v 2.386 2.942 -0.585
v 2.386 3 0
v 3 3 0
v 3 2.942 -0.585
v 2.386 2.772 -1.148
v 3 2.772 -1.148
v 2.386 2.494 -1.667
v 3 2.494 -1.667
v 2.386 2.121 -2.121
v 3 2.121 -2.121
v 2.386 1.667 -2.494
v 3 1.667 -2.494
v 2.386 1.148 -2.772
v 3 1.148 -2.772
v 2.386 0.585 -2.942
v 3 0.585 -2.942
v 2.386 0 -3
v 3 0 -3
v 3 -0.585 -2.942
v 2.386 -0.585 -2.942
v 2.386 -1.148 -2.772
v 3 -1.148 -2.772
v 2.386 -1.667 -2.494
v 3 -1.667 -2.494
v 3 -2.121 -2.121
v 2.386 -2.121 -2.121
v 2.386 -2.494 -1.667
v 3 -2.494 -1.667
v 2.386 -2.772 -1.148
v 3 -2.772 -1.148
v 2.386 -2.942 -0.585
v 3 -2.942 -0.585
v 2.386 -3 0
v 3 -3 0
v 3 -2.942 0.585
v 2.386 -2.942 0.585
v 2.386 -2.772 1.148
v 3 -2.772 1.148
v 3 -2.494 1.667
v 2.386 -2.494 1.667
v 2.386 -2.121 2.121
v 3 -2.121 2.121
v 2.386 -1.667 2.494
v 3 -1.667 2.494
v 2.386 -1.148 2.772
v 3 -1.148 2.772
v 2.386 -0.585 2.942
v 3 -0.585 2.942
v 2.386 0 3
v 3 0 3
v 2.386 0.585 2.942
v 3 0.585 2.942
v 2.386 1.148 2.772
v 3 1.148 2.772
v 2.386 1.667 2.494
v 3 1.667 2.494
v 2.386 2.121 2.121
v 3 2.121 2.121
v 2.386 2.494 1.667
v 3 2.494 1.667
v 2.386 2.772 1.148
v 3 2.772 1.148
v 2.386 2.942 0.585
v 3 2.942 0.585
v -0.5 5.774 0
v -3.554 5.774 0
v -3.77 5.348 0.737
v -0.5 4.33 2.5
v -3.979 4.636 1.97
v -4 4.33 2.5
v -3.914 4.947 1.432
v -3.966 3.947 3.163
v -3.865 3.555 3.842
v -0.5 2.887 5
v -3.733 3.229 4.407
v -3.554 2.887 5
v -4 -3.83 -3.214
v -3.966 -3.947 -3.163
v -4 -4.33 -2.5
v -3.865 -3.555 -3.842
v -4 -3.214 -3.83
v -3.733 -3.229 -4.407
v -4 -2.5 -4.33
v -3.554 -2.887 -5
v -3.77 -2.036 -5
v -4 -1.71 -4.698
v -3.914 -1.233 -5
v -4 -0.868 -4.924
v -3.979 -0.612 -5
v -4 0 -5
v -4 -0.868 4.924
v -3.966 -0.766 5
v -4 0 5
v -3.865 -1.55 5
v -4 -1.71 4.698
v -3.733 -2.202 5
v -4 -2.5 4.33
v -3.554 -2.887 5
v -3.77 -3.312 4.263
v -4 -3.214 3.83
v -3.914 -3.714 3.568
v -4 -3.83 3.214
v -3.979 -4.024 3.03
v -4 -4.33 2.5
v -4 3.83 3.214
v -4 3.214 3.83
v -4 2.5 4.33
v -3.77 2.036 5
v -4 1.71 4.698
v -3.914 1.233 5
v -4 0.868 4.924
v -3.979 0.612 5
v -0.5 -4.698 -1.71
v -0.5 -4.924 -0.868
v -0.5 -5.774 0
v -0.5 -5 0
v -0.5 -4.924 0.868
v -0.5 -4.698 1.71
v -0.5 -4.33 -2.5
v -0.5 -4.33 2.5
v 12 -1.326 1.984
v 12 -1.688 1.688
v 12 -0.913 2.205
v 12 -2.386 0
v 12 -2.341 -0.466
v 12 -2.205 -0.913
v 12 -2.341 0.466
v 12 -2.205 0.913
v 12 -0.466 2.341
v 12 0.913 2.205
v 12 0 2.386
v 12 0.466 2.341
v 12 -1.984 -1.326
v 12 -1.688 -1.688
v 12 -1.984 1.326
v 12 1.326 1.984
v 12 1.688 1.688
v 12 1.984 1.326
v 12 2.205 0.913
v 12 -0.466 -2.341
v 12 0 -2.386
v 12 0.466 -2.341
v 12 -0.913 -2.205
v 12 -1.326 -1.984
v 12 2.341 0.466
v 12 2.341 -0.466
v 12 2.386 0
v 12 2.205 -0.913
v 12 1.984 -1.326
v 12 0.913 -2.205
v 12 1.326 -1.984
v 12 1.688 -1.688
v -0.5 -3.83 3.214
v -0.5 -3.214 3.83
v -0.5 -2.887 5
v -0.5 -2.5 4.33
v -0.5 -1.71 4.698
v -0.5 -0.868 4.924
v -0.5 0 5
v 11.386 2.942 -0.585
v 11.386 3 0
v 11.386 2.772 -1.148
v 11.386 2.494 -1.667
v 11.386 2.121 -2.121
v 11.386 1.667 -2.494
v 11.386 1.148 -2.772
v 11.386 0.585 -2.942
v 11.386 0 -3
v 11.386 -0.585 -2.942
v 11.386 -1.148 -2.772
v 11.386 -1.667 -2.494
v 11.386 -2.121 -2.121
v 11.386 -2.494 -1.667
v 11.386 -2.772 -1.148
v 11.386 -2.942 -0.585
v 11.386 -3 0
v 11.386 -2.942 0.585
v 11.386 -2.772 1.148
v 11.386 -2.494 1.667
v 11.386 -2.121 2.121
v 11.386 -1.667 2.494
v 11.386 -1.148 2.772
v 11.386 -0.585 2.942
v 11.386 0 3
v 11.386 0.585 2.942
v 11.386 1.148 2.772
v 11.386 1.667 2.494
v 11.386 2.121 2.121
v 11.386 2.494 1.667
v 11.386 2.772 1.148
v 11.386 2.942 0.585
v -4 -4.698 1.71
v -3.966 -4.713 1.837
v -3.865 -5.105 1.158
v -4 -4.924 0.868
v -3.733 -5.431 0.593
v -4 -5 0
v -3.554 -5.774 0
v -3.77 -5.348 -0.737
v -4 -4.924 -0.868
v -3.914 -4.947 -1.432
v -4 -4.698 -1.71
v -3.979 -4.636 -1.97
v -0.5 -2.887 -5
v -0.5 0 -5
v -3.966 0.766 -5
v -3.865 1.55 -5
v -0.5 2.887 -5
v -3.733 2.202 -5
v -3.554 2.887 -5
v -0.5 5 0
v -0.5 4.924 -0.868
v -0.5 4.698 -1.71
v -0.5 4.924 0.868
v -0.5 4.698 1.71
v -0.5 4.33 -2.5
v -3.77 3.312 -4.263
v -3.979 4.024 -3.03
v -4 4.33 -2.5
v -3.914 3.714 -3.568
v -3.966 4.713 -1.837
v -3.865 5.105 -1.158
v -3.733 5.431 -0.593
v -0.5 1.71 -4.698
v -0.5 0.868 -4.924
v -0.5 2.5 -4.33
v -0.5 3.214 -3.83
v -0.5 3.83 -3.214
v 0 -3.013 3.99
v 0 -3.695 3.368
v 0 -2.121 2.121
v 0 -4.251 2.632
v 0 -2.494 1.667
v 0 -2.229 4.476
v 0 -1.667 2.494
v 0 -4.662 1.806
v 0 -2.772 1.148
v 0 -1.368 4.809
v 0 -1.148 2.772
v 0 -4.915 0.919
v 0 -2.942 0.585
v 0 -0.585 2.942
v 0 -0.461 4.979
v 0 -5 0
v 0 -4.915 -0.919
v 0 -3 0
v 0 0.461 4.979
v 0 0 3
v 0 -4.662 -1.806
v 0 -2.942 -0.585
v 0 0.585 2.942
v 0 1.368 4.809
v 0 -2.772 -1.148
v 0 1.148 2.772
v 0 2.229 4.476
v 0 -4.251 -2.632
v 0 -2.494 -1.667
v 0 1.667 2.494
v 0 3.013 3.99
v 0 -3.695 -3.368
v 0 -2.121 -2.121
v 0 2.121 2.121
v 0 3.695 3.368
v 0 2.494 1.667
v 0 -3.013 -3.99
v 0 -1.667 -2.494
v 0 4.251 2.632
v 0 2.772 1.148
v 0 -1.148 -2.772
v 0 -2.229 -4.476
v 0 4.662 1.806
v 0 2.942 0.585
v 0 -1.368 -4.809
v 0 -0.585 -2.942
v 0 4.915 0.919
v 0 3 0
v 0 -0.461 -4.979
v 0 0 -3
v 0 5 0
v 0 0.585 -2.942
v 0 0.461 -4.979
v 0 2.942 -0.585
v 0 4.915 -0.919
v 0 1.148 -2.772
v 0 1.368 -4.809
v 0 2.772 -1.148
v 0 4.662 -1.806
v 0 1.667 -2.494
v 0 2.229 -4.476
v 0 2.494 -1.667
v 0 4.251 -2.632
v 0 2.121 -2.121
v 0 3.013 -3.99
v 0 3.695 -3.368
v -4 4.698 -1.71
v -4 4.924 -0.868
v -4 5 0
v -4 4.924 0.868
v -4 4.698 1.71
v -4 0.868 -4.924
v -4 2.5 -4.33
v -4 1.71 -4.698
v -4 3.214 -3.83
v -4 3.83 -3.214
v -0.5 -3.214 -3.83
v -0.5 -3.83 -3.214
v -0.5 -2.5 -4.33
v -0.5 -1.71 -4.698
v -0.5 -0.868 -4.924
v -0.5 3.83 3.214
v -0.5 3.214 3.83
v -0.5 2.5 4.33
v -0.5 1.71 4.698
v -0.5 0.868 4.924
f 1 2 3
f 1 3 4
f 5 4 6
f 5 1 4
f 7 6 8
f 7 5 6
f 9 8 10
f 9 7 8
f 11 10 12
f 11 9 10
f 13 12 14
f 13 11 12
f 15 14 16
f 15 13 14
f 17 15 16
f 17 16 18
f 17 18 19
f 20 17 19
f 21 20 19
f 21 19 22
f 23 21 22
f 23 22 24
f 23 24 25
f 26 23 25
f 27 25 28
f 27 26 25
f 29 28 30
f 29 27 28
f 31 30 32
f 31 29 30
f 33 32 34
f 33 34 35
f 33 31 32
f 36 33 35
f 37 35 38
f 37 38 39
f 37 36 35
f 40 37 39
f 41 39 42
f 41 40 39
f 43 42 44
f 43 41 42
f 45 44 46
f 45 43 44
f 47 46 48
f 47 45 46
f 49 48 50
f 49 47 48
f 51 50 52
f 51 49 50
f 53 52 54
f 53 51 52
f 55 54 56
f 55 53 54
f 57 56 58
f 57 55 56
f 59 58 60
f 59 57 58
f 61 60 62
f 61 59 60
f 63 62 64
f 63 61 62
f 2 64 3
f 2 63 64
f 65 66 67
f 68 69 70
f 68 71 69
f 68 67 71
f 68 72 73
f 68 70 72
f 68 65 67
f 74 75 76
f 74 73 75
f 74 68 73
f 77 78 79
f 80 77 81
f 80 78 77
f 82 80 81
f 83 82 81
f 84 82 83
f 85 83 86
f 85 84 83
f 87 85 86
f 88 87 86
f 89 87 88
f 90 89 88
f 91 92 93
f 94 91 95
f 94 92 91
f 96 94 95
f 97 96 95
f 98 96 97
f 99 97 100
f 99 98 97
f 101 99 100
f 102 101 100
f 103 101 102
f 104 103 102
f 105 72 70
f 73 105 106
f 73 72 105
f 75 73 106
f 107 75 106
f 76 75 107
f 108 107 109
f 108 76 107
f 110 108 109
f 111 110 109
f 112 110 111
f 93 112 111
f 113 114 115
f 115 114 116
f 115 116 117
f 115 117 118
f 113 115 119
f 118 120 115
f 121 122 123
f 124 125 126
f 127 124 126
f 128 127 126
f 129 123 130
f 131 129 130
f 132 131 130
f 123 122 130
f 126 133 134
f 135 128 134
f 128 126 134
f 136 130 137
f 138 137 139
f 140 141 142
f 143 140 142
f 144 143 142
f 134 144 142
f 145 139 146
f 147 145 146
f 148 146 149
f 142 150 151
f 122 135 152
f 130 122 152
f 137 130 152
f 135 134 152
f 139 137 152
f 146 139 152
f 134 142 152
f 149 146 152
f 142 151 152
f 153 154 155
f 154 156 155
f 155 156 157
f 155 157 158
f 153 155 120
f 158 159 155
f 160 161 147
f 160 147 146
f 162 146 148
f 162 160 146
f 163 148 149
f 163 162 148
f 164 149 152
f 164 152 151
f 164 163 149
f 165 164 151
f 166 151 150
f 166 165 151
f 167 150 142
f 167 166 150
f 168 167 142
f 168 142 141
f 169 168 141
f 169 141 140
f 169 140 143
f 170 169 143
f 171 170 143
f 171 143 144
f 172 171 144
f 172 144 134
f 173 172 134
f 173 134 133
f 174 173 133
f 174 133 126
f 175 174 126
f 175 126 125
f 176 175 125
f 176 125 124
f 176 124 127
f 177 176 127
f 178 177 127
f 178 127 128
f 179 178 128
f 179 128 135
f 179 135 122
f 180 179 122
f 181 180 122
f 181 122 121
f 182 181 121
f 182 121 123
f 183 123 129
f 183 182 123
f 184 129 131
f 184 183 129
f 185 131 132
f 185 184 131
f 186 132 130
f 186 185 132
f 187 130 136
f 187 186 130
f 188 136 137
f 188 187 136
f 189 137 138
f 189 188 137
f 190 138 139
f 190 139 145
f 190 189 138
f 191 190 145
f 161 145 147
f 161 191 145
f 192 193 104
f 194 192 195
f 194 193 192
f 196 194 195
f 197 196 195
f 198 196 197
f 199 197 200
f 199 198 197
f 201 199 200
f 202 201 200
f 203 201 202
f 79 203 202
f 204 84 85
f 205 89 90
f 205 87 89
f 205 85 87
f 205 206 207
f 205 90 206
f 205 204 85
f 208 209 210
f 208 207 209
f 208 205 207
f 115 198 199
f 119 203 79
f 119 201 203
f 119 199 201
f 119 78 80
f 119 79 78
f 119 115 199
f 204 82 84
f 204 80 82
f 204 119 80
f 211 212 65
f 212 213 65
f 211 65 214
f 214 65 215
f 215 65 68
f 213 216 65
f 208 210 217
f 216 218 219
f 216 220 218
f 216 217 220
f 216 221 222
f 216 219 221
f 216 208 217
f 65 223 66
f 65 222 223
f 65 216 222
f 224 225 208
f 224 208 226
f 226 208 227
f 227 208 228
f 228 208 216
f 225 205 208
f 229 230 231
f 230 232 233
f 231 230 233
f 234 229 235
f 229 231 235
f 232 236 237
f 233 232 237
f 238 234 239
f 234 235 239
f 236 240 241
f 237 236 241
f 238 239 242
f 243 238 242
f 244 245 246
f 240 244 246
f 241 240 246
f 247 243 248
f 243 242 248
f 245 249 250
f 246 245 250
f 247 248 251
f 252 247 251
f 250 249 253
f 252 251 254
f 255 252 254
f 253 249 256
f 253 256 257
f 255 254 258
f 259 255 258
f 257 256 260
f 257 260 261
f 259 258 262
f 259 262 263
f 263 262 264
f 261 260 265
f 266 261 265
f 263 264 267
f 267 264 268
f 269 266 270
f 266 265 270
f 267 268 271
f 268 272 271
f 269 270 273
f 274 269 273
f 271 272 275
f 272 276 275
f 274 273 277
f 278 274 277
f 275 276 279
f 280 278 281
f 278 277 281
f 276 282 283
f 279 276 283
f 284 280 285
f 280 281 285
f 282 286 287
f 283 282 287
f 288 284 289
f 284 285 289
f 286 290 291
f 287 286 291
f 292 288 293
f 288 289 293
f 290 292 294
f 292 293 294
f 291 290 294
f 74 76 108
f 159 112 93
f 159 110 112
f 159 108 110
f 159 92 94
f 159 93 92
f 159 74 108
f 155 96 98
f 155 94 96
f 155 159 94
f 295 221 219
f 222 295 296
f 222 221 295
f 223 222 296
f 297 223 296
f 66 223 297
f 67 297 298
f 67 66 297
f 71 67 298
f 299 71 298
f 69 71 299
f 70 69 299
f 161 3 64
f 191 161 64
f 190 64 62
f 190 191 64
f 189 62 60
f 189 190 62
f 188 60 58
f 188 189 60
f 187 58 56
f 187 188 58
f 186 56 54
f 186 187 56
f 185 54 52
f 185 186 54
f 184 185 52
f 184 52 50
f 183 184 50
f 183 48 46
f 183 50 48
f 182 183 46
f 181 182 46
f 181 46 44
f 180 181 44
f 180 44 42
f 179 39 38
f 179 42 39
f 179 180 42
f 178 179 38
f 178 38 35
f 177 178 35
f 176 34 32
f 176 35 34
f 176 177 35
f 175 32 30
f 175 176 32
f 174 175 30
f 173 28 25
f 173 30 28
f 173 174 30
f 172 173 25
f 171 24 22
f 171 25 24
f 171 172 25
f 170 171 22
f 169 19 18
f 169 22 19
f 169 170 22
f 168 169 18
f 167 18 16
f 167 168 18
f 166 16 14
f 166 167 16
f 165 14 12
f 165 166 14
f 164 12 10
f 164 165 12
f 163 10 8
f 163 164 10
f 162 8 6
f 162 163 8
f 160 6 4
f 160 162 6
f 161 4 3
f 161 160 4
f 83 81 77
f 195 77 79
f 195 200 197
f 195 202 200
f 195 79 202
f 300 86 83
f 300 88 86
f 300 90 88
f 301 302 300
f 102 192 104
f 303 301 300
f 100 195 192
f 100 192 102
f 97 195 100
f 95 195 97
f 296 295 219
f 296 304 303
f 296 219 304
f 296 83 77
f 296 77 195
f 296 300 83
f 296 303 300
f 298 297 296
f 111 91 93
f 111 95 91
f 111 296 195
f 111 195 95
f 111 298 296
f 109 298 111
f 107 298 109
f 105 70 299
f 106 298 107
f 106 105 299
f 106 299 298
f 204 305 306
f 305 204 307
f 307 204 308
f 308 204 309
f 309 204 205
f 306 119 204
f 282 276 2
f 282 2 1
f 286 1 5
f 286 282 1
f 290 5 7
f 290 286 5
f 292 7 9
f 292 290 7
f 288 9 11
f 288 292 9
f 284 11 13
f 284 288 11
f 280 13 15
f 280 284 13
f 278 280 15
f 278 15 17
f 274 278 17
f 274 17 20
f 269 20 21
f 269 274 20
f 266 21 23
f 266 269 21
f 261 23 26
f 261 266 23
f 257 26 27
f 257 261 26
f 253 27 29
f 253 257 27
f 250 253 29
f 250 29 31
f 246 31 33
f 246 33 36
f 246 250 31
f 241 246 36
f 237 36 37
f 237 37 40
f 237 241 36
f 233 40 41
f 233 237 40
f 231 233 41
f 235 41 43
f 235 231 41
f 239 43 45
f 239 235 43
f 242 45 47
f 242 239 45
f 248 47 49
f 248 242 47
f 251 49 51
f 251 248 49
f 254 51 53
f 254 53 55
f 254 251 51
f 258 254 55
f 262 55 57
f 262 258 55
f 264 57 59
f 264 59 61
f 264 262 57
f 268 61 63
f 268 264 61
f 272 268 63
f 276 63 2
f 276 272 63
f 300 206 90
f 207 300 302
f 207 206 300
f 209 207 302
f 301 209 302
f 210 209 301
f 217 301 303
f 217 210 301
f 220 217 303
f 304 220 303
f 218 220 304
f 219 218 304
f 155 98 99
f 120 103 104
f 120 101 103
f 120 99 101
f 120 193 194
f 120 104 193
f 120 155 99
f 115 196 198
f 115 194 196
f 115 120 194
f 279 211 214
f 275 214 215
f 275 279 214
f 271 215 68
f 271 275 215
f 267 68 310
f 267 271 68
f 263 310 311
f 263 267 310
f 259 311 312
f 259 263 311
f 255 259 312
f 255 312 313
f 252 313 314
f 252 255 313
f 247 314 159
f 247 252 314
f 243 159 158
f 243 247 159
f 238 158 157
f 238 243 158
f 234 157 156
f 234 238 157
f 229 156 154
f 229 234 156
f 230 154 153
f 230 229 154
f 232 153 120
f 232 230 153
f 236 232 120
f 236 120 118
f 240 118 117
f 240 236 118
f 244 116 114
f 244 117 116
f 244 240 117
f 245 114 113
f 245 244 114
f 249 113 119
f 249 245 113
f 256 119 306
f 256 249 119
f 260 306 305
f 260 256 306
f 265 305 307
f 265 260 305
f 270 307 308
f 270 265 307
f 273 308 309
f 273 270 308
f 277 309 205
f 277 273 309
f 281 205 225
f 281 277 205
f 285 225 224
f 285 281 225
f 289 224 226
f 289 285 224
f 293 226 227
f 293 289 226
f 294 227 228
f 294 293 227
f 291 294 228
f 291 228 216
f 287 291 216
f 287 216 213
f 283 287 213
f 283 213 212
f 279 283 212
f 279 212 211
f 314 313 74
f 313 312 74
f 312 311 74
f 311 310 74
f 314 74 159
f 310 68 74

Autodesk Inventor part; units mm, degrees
ref_plane "YZ Plane" through (0, 0, 0) normal (1, 0, 0) x (0, 1, 0)
ref_plane "XZ Plane" through (0, 0, 0) normal (0, 1, 0) x (-1, 0, 0)
sketch "Sketch1" plane through (0, 0, 0) normal (0, 0, 1) x (1, 0, 0)
  line L0 (0, 5) -> (0, 3)
  line L1 (3, 3) -> (12, 3)
  line L2 (12, 3) -> (12, 0)
  line L3 (12, 0) -> (-0.5001, 0)
  line L4 (-3.0001, 0) -> (14.5, 0) projected
  line L5 (-0.5001, 0) -> (-0.5001, 5)
  line L6 (-0.5001, 5) -> (0, 5)
  line L7 (3, 3) -> (2.3865, 3)
  line L8 (2.3865, 3) -> (0, 3)
  line L9 (0, -1) -> (0, 6) projected
  dimension "d0" = 12
  dimension "d1" = 9
  dimension "d2" = 6
  dimension "d9" = 0.5001
  dimension "d10" = 10
  dimension "d13" = 0.6136
  dimension "d14" = 6
revolve "Body" add sketch "Sketch1" angle 360 about axis through (12, 0, 0) along (-1, 0, 0)
sketch "Sketch2" plane through (-0.5001, 0, 0) normal (-1, 0, 0) x (0, 0, 1)
  line L0 (0, 5.7735) -> (5, 2.8868)
  line L1 (5, 2.8868) -> (5, -2.8868)
  line L2 (5, -2.8868) -> (0, -5.7735)
  line L3 (0, -5.7735) -> (-5, -2.8868)
  line L4 (-5, -2.8868) -> (-5, 2.8868)
  line L5 (-5, 2.8868) -> (0, 5.7735)
  point P0 (0, 0)
  point P1 (0, 0)
  dimension "d11" = 10
extrude "Head" add sketch "Sketch2" along normal blind 3.5
sketch "Sketch4" plane through (0, 0, 0) normal (0, 0, 1) x (1, 0, 0)
  line L0 (-4.0001, 5) -> (-4.0001, 5.7735)
  line L1 (-4.0001, 5.7735) -> (-3.5535, 5.7735)
  line L2 (-3.5535, 5.7735) -> (-4.0001, 5)
  line L3 (-4.7001, 0) -> (0.1999, 0) projected
  line L4 (-0.5001, 5.7735) -> (-4.0001, 5.7735) projected
  line L5 (-4.0001, 2.8868) -> (-4.0001, 5.7735) projected
  dimension "d5" = 30
  dimension "d19" = 10
revolve "Chamfer1" cut sketch "Sketch4" angle 360 about axis through (-10, 0, 0) along (1, 0, 0)
thread "Thread" size "M6x1" class "6g" standard "ISO Metric profile" length 9
chamfer "Chamfer2" distance 0.6135 distance2 0.6136 1 edges at (12, -3, 0) measured on face at (12, -0.5681, 0.823)
ref_plane "Work Plane1" through (1.525, 0, 0) normal (0, 0, 1) x (1, 0, 0)
equation "\"d11\" = SW"
equation "\"d3\" = KOH - SD"
equation "\"d15\" = GEL"
equation "\"d6\" = -0.5 * SPD + 0.5 * GD"
equation "\"d0\" = NLG"
equation "\"d1\" = GEL"
equation "\"d2\" = GD"
equation "\"d10\" = SD2"
equation "\"d14\" = BDM"
equation "\"d5\" = ANG1"
equation "\"d19\" = SW0"
equation "\"NLG\" = 12"
equation "\"GD\" = NND"
equation "\"BDM\" = NND"
equation "\"KOH\" = 4"
equation "\"GEL\" = 9"
equation "\"SW\" = 10"
equation "\"SW0\" = SW"
equation "\"SPD\" = NND - 1.2269 * PTC"
equation "\"SD2\" = SW"
equation "\"SD\" = 0.5"
equation "\"ANG1\" = 30deg"
equation "\"GAL\" = 0.61345 * PTC"
equation "\"GUL\" = 0.61345 * PTC"
equation "\"RR\" = 0.25"
equation "\"WFT\" = SD"
equation "\"GD1\" = THREADDIA - 1.2269 * PTC"
equation "\"THREADDIA\" = 6"
equation "\"TOA\" = 30deg"
equation "\"FAWI\" = 45deg"
equation "\"PTC\" = 1"
equation "\"NND\" = 6"
equation "\"E0\" = 1.155 * SW"
properties part number "AS 1110 - M6 x 12" material "Steel, Mild"
